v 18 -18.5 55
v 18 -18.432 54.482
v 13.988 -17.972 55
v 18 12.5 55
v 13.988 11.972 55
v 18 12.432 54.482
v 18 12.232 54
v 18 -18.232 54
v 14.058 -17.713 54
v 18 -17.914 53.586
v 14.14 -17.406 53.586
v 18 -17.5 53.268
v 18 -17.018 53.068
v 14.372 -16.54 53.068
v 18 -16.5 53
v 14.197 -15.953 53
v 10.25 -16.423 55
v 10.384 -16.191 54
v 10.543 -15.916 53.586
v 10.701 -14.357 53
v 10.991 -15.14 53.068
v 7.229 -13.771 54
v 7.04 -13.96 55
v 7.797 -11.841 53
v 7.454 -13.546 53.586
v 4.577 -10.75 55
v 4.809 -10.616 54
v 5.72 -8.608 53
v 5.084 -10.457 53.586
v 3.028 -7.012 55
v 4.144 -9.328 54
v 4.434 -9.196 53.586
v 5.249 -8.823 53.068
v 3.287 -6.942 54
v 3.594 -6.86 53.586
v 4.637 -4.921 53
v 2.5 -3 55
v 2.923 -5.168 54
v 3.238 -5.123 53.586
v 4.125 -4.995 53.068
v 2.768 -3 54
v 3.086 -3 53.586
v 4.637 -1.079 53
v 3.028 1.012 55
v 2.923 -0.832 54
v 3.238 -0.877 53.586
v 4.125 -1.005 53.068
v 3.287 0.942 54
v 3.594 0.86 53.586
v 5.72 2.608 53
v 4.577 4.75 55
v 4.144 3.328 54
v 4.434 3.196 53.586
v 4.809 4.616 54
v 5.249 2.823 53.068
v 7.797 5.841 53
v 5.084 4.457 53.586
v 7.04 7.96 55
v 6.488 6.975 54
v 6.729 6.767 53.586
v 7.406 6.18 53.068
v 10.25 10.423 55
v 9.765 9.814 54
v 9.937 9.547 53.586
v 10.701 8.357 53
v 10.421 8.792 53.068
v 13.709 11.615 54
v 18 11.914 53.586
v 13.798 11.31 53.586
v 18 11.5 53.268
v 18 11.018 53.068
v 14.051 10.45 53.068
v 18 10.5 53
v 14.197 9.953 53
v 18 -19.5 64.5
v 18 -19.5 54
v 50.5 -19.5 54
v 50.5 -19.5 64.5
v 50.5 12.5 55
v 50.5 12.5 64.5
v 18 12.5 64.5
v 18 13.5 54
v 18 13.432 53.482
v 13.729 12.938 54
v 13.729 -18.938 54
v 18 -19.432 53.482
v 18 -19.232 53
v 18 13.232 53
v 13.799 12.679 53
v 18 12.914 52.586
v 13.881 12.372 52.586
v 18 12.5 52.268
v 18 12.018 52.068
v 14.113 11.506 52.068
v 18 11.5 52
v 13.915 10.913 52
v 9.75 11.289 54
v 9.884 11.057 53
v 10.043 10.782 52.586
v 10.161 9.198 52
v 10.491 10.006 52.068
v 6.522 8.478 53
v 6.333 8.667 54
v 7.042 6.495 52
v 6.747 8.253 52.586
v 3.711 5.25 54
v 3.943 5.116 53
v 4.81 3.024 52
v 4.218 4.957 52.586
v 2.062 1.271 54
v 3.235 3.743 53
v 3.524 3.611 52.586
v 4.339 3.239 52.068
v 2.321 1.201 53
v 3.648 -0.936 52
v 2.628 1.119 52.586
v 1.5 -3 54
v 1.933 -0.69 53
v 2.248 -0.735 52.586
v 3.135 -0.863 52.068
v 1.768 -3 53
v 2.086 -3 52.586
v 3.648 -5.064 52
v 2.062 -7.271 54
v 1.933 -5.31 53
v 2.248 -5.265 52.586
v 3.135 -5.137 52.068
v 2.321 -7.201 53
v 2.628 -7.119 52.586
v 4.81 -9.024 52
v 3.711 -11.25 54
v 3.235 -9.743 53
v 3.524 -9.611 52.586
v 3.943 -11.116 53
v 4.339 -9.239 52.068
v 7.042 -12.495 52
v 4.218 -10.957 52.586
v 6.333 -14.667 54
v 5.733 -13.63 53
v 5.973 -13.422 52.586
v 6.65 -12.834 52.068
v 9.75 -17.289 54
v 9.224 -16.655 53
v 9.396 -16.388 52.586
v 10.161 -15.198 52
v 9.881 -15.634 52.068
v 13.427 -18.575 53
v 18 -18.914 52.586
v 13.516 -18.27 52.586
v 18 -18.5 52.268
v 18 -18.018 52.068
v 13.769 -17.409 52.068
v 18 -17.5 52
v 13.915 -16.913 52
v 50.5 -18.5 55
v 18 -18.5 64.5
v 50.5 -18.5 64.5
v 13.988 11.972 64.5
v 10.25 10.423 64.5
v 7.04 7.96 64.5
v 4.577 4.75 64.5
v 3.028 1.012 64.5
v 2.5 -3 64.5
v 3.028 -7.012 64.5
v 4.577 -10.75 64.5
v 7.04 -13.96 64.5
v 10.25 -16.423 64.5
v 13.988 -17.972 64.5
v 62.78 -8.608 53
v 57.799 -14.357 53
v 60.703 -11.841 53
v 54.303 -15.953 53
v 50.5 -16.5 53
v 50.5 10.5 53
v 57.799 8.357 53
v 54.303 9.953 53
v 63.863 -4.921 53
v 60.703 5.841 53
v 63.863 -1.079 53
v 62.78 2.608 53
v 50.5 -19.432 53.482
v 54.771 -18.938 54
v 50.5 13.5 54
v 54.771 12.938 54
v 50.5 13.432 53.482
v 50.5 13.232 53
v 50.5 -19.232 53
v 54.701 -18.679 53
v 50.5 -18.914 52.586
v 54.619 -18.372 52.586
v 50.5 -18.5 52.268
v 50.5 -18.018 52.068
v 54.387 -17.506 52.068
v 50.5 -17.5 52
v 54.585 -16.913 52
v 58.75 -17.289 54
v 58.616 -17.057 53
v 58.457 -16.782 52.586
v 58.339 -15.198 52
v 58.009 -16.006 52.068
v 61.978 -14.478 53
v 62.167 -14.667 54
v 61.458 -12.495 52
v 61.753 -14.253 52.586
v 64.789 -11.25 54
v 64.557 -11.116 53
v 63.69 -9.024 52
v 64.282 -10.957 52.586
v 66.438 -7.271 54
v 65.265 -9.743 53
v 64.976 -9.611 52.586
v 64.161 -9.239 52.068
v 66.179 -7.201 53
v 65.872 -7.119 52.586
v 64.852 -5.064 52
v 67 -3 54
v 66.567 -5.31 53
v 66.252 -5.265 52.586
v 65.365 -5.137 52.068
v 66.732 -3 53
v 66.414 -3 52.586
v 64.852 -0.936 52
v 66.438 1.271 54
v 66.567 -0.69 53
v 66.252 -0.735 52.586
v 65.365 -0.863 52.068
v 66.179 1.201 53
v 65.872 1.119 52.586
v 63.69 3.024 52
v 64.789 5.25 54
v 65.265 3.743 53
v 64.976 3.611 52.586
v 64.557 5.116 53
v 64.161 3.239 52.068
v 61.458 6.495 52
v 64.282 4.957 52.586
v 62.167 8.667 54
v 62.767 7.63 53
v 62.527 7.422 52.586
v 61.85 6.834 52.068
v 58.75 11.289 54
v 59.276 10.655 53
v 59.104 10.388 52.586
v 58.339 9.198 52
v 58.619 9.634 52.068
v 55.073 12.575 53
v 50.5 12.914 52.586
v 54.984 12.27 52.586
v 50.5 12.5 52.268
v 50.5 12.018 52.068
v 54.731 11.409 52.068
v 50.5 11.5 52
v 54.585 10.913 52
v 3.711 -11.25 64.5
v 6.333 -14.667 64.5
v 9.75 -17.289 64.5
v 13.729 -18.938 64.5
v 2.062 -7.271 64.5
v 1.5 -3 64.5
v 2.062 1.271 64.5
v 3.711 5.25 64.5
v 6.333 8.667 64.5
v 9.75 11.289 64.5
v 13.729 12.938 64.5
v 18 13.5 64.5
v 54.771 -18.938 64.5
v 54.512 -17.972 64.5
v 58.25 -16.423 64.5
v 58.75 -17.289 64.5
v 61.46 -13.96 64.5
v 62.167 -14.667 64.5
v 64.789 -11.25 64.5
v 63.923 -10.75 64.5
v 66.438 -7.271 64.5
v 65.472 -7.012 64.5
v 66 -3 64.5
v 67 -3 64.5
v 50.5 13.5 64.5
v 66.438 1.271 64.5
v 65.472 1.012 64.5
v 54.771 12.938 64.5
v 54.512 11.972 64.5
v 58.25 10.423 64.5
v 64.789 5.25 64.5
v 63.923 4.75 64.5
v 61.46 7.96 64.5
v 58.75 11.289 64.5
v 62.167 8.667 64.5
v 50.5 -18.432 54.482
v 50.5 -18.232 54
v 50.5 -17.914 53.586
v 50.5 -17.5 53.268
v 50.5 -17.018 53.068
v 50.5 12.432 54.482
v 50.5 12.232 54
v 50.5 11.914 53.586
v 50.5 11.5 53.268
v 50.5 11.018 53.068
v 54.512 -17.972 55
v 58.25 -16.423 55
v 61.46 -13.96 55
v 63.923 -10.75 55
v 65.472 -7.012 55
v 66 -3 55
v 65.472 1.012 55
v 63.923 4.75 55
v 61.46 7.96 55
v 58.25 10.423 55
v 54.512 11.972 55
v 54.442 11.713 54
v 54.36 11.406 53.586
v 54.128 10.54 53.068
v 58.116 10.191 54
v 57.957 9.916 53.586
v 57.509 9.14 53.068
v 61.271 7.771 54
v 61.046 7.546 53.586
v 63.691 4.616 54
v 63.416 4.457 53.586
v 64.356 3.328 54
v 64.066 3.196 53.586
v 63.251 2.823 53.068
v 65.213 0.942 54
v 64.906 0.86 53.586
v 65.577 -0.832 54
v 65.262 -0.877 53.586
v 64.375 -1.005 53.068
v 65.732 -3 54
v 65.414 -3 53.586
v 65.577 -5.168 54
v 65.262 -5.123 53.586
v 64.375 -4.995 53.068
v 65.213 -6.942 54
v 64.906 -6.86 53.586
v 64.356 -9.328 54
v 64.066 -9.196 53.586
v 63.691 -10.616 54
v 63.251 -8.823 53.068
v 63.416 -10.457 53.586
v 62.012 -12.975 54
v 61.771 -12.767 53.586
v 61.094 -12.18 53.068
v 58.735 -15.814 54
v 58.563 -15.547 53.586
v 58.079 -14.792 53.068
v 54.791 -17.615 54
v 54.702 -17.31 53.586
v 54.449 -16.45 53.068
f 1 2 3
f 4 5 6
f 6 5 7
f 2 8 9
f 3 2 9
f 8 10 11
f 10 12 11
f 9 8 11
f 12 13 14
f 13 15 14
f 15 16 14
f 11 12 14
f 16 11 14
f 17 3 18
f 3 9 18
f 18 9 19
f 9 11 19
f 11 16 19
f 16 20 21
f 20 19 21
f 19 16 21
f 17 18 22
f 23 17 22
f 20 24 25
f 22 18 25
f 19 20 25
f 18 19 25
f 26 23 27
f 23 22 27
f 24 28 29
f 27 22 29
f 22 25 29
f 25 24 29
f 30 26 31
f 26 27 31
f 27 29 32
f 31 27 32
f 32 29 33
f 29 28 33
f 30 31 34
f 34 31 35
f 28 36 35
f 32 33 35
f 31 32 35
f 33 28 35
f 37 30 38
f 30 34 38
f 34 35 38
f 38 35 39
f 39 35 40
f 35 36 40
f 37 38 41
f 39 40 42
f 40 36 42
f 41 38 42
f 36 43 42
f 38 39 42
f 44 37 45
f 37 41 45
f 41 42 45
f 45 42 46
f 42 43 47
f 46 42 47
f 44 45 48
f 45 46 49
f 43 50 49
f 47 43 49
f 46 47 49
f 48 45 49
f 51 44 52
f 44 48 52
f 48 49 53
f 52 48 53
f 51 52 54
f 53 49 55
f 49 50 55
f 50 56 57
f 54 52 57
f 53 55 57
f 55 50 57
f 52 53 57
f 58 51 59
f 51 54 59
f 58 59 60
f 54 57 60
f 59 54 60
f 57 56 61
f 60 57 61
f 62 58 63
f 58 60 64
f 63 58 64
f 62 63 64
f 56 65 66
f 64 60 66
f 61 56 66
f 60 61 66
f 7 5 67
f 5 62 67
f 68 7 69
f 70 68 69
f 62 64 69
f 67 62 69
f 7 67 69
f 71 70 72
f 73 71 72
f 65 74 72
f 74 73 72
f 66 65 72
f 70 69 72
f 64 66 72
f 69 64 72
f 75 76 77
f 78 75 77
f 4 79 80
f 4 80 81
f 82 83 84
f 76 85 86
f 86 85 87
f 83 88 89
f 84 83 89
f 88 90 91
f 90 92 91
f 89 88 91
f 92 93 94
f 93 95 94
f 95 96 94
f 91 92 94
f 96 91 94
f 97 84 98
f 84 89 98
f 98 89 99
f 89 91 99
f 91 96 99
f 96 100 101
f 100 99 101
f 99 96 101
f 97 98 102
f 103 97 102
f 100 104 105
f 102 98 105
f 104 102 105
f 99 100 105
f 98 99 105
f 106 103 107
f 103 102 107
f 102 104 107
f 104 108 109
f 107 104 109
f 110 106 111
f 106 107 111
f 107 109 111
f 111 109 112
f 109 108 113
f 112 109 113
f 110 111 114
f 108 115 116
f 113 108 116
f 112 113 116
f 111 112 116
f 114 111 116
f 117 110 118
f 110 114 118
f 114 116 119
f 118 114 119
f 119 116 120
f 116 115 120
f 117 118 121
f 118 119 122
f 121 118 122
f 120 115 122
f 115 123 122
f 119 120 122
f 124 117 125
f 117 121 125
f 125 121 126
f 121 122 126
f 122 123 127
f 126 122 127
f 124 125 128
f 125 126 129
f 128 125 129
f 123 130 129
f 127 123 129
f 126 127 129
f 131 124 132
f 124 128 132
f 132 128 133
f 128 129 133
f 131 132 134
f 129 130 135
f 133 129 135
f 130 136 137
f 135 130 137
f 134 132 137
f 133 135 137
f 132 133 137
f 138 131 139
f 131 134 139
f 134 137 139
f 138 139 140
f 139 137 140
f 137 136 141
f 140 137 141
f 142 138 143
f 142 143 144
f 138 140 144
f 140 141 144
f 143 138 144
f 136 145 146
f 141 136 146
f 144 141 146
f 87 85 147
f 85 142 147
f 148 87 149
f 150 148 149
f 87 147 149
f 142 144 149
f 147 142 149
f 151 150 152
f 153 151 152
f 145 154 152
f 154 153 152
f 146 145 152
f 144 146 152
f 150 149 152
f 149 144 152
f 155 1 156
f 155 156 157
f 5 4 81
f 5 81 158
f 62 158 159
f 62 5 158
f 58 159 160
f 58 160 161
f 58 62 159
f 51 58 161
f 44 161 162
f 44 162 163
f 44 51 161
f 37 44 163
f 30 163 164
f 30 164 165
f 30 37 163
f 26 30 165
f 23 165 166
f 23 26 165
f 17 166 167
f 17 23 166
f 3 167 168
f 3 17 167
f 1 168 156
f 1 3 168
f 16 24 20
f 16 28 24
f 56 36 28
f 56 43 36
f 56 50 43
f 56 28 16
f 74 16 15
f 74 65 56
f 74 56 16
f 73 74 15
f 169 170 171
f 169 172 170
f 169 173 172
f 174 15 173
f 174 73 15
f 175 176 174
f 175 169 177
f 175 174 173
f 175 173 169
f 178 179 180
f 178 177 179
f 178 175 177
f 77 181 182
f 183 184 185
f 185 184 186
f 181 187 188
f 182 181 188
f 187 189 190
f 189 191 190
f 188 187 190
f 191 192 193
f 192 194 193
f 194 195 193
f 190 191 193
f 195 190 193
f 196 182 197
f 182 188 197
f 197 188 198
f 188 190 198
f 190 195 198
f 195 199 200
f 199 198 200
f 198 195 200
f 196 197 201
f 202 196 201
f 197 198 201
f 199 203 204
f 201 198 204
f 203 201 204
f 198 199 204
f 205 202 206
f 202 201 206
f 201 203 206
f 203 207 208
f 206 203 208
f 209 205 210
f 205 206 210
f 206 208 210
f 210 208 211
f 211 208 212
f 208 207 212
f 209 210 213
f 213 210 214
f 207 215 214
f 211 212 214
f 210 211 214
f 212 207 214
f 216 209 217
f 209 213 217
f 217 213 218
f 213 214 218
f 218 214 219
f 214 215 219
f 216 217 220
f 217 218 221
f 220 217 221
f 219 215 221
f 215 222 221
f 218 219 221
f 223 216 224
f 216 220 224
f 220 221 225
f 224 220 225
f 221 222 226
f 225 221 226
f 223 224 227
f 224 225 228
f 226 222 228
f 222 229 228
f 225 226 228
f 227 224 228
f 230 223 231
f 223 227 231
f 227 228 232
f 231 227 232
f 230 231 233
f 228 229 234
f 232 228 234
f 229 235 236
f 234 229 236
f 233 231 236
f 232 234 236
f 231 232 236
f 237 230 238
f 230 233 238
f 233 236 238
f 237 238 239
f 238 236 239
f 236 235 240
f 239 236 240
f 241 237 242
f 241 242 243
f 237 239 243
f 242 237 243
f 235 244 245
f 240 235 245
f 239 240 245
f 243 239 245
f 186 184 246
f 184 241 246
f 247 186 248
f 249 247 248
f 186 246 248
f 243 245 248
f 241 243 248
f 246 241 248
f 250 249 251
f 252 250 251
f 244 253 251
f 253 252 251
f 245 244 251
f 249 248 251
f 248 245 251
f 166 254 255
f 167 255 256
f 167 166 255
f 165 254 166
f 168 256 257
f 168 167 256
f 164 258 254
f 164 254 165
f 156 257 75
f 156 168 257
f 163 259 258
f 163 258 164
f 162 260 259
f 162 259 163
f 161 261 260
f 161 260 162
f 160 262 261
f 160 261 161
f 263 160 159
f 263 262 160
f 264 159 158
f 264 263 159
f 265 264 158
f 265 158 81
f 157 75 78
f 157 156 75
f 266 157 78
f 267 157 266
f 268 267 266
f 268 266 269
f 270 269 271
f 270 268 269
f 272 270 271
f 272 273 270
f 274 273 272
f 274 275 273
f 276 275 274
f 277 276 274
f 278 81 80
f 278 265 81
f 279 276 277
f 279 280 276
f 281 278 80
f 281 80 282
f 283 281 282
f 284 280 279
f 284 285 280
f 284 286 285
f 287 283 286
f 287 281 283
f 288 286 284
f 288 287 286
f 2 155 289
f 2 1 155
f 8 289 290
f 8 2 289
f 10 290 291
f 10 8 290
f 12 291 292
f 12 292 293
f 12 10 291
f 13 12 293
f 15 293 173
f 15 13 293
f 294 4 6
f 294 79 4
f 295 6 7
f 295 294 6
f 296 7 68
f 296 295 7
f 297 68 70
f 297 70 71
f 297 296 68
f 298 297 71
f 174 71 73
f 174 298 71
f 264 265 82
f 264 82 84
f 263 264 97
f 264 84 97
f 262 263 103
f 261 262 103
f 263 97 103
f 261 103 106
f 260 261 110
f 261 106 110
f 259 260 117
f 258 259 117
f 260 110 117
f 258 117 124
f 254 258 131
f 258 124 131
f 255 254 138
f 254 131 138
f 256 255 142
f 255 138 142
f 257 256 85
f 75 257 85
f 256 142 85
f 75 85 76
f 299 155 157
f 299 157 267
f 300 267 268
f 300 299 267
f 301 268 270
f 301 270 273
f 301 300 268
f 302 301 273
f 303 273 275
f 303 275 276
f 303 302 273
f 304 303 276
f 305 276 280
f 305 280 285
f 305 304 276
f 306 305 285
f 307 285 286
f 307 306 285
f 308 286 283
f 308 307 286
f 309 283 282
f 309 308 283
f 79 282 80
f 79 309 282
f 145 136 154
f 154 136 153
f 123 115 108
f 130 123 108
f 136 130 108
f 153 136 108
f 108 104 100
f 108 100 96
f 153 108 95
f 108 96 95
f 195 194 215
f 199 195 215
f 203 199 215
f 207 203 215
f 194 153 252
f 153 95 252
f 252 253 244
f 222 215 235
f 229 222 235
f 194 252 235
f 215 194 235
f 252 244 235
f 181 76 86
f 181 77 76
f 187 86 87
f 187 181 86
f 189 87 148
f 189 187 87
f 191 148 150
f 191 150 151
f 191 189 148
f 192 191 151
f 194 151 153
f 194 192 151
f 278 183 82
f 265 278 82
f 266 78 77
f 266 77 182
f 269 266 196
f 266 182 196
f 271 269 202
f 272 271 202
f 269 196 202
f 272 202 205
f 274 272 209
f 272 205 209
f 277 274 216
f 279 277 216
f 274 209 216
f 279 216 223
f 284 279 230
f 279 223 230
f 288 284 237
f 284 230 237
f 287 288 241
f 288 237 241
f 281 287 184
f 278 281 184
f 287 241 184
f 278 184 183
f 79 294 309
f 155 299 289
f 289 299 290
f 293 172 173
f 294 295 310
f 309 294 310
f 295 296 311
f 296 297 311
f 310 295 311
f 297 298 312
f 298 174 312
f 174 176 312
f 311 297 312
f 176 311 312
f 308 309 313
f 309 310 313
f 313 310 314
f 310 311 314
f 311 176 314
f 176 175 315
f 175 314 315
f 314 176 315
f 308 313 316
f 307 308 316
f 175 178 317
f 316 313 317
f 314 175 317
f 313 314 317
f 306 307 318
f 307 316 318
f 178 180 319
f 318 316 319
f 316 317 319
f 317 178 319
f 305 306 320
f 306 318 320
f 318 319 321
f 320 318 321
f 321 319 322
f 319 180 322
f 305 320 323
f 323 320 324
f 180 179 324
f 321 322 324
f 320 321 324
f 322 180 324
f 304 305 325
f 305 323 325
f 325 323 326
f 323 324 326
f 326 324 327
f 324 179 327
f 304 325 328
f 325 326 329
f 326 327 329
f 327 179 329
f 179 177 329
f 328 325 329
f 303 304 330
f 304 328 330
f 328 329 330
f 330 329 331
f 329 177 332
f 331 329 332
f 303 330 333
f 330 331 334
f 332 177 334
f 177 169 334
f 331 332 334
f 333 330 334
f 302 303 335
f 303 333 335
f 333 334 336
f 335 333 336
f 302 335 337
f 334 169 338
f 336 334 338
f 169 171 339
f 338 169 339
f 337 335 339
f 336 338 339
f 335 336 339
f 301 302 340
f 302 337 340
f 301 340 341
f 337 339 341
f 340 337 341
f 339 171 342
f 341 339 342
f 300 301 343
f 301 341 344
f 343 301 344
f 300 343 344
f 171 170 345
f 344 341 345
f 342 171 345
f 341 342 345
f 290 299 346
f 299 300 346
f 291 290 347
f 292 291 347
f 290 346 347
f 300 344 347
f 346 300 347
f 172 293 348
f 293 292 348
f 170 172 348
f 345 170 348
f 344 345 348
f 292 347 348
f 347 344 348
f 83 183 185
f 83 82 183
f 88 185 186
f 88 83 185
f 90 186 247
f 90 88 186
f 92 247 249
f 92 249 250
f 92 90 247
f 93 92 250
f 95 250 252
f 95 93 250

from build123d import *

# Parameters (mm, degrees)
PAD004_DEPTH   = 12.5
THICKNESS002_T = -1
FILLET006_R    = 2
FILLET007_R    = 2


with BuildPart() as part:
    # Sketch009 → Pad004 (new body)
    with BuildSketch(Plane.XY):
        with BuildLine():
            ThreePointArc((-83, 72.5), (-99.5, 56), (-83, 39.5))
            Line((-83, 39.5), (-50.5, 39.5))
            ThreePointArc((-50.5, 39.5), (-34, 56), (-50.5, 72.5))
            Line((-50.5, 72.5), (-83, 72.5))
        make_face()
    extrude(amount=PAD004_DEPTH)

    # Thickness002
    thickness002_openings = [part.faces().sort_by_distance(p)[0] for p in [
        (-66.75, 56, 12.5),
    ]]
    offset(amount=THICKNESS002_T, openings=thickness002_openings)

    # Fillet006
    fillet006_edges = [part.edges().sort_by_distance(p)[0] for p in [
        (-98.5, 56, 1),
        (-66.75, 40.5, 1),
        (-35, 56, 1),
        (-66.75, 71.5, 1),
    ]]
    fillet(fillet006_edges, radius=FILLET006_R)

    # Fillet007
    fillet007_edges = [part.edges().sort_by_distance(p)[0] for p in [
        (-99.5, 56, 0),
        (-66.75, 39.5, 0),
        (-34, 56, 0),
        (-66.75, 72.5, 0),
    ]]
    fillet(fillet007_edges, radius=FILLET007_R)


with BuildPart() as part_1:
    # Body004 placement: moved
    add(part.part.moved(Location((101, -59, 52))))


solid = part_1.part
